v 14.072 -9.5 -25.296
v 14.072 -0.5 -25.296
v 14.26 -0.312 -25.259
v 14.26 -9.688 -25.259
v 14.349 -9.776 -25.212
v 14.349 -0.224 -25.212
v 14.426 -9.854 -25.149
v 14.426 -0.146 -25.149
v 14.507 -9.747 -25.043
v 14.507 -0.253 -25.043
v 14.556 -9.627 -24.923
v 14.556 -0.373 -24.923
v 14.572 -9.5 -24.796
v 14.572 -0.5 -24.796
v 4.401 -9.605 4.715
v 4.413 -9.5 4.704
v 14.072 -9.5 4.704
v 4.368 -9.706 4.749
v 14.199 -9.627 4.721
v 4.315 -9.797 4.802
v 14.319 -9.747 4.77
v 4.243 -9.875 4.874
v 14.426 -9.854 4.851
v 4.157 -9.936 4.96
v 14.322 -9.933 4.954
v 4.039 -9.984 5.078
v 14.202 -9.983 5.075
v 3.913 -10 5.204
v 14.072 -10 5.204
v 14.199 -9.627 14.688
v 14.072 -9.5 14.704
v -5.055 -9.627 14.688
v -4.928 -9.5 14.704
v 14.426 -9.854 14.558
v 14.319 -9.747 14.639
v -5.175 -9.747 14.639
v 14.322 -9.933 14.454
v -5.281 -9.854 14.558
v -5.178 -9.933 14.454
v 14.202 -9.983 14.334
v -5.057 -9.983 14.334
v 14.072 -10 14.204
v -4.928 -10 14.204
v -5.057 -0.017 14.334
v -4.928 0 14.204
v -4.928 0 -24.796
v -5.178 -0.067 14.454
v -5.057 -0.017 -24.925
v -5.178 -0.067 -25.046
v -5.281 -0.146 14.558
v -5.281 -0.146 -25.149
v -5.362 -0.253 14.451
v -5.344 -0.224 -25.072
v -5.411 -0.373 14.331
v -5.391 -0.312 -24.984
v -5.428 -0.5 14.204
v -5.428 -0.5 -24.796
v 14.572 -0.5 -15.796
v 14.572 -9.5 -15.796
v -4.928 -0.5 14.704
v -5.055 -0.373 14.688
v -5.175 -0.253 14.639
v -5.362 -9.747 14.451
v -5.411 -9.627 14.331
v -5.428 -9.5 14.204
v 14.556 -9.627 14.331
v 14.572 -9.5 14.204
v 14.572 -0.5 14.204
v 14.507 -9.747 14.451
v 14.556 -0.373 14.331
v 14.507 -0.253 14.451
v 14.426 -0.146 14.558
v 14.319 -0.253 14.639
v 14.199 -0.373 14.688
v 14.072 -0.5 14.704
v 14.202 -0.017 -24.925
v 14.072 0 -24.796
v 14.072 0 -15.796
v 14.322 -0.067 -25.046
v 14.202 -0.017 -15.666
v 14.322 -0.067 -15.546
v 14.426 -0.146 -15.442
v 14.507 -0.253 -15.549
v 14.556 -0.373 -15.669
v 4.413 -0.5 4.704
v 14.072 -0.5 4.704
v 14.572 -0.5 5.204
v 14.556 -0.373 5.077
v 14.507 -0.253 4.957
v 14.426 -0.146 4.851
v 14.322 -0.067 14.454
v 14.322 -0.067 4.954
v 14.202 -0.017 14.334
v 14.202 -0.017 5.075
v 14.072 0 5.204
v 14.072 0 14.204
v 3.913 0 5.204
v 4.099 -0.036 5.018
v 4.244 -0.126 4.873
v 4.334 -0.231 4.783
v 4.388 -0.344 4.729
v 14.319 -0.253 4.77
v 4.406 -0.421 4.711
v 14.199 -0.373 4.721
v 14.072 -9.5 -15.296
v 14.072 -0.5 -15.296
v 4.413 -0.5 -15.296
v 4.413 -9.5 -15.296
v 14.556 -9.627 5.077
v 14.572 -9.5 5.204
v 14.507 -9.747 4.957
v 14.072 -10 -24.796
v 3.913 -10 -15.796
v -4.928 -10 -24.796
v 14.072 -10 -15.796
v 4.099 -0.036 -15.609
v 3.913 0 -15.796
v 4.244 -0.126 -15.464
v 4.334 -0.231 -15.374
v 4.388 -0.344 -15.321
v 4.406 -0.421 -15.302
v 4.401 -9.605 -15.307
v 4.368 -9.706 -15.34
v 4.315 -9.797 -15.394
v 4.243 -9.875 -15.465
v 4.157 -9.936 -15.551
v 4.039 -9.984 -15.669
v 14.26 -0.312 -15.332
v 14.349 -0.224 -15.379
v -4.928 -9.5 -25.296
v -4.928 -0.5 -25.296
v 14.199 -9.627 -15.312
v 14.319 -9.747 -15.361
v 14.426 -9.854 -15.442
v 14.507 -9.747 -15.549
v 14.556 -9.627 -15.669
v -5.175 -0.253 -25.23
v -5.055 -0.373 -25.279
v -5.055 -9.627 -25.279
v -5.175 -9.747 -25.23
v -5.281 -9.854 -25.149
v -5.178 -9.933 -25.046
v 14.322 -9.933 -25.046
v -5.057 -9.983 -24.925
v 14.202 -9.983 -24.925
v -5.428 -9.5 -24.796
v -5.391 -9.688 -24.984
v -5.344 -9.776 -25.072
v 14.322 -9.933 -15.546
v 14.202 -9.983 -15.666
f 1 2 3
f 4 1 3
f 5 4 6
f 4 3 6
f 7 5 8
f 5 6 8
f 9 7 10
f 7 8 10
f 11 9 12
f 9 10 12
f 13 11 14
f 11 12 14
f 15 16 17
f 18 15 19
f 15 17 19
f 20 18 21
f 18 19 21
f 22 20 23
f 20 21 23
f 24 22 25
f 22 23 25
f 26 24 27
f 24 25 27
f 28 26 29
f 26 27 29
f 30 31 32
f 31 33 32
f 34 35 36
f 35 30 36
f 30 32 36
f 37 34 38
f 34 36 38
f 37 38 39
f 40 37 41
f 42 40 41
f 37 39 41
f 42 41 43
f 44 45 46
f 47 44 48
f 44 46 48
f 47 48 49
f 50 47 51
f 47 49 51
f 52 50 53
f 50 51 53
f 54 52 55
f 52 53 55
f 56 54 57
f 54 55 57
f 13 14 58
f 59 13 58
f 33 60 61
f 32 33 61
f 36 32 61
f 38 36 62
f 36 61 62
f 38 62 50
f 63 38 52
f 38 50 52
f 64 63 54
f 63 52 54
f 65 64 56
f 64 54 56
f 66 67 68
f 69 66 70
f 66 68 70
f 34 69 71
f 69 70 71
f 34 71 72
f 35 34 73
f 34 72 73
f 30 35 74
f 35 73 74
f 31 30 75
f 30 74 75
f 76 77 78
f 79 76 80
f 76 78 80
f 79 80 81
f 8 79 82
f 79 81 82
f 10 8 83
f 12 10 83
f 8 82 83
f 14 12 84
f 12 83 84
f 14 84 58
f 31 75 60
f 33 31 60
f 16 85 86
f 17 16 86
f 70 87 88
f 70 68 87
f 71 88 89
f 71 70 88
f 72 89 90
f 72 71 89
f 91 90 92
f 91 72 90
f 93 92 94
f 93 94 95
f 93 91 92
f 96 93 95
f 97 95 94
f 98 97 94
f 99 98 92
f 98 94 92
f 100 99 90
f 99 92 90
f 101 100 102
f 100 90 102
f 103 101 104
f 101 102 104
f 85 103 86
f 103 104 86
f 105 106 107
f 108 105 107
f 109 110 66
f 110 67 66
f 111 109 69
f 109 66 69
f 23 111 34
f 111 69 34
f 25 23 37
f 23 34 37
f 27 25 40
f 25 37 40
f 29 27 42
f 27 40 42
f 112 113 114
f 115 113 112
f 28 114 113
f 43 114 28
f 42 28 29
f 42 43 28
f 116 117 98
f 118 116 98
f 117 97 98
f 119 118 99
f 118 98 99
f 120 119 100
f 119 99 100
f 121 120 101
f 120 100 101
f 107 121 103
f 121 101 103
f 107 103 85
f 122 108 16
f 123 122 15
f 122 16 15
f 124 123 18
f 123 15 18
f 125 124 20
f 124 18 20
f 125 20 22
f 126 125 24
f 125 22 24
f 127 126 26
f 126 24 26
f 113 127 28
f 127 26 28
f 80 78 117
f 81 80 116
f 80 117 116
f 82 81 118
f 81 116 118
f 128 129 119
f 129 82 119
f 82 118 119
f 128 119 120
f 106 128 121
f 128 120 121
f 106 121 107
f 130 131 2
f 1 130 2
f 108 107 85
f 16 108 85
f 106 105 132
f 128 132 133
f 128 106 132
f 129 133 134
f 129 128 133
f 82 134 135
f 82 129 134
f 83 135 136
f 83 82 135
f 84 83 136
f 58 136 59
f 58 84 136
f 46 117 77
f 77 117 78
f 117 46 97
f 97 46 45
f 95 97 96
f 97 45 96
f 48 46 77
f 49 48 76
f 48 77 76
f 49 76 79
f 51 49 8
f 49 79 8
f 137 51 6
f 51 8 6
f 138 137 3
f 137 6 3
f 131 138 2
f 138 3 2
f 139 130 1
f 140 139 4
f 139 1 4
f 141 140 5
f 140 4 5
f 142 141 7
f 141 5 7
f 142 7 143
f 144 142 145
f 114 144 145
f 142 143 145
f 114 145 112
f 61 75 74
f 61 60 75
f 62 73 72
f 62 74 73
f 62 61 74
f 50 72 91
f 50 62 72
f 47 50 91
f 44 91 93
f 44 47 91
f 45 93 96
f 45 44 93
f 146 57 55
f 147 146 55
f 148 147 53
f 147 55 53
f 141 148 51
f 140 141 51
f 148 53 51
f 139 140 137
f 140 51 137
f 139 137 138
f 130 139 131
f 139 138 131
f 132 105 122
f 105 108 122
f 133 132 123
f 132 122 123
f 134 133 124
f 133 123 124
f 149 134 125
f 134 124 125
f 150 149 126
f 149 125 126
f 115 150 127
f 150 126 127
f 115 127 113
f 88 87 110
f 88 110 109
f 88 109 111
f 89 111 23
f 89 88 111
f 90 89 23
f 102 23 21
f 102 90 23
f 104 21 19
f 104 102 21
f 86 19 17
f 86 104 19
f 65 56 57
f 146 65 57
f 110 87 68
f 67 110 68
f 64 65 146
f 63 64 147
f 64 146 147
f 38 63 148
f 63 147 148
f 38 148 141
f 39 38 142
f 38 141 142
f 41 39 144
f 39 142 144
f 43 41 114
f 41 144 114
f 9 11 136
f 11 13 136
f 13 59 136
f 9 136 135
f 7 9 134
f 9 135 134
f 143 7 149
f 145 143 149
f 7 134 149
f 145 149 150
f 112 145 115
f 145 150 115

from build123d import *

# Parameters (mm, degrees)
F1_DEPTH    = 10
F2_R        = 0.5
F3_R        = 0.5
F4_T1_DEPTH = 11.5


# Not quite as in the source:
# - a fillet or chamfer that OpenCascade refuses, or shapes differently, is made with other operations: its cross-section is extruded or revolved along the edge and cut away or added


with BuildPart() as f1:
    # F0 (on Front) → F1 (new body)
    with BuildSketch(Plane.XZ):
        Polygon((14.5721812431, 14.7042763403), (-5.4278187569, 14.7042763403), (-5.4278187569, -25.2957236597), (14.5721812431, -25.2957236597), (14.5721812431, -15.2957236597), (4.4125382692, -15.2957236597), (4.4125382692, 4.7042763403), (14.5721812431, 4.7042763403), align=None)
    extrude(amount=F1_DEPTH)

    # F2
    f2_edges = [f1.edges().sort_by_distance(p)[0] for p in [
        (14.572181, -10, 9.704276),
        (4.572181, -10, 14.704276),
        (-5.427819, -10, -5.295724),
        (4.572181, -10, -25.295724),
        (14.572181, -10, -20.295724),
        (9.49236, -10, -15.295724),
        (4.412538, -10, -5.295724),
        (9.49236, -10, 4.704276),
    ]]
    fillet(f2_edges, radius=F2_R)

    # F3
    f3_edges = [f1.edges().sort_by_distance(p)[0] for p in [
        (14.572181, 0, 9.704276),
        (4.572181, 0, 14.704276),
        (-5.427819, 0, -5.295724),
        (4.572181, 0, -25.295724),
        (14.572181, 0, -20.295724),
        (9.49236, 0, -15.295724),
        (4.412538, 0, -5.295724),
        (9.49236, 0, 4.704276),
    ]]
    fillet(f3_edges, radius=F3_R)

    # F4: fillet of radius 0.5 on 16 edges, made by hand

    # F4_s2 → F4_t1 (cut)
    with BuildSketch(Plane.XZ.offset(-0.75)):
        with BuildLine():
            ThreePointArc((14.0721812431, -25.2957236597), (14.4257346337, -25.1492770503), (14.5721812431, -24.7957236597))
            Line((14.5721812431, -24.7957236597), (14.5721812431, -25.2957236597))
            Line((14.5721812431, -25.2957236597), (14.0721812431, -25.2957236597))
        make_face()
        with BuildLine():
            ThreePointArc((14.0721812431, -15.2957236597), (14.4257346337, -15.4421702691), (14.5721812431, -15.7957236597))
            Line((14.5721812431, -15.7957236597), (14.5721812431, -15.2957236597))
            Line((14.5721812431, -15.2957236597), (14.0721812431, -15.2957236597))
        make_face()
        with BuildLine():
            ThreePointArc((-5.4278187569, -24.7957236597), (-5.2813721475, -25.1492770503), (-4.9278187569, -25.2957236597))
            Line((-4.9278187569, -25.2957236597), (-5.4278187569, -25.2957236597))
            Line((-5.4278187569, -25.2957236597), (-5.4278187569, -24.7957236597))
        make_face()
        with BuildLine():
            ThreePointArc((14.5721812431, 5.2042763403), (14.4257346337, 4.8507229497), (14.0721812431, 4.7042763403))
            Line((14.0721812431, 4.7042763403), (14.5721812431, 4.7042763403))
            Line((14.5721812431, 4.7042763403), (14.5721812431, 5.2042763403))
        make_face()
        with BuildLine():
            ThreePointArc((14.5721812431, 14.2042763403), (14.4257346337, 14.5578297309), (14.0721812431, 14.7042763403))
            Line((14.0721812431, 14.7042763403), (14.5721812431, 14.7042763403))
            Line((14.5721812431, 14.7042763403), (14.5721812431, 14.2042763403))
        make_face()
        with BuildLine():
            ThreePointArc((-4.9278187569, 14.7042763403), (-5.2813721475, 14.5578297309), (-5.4278187569, 14.2042763403))
            Line((-5.4278187569, 14.2042763403), (-5.4278187569, 14.7042763403))
            Line((-5.4278187569, 14.7042763403), (-4.9278187569, 14.7042763403))
        make_face()
    extrude(amount=F4_T1_DEPTH, mode=Mode.SUBTRACT)


solid = f1.part
